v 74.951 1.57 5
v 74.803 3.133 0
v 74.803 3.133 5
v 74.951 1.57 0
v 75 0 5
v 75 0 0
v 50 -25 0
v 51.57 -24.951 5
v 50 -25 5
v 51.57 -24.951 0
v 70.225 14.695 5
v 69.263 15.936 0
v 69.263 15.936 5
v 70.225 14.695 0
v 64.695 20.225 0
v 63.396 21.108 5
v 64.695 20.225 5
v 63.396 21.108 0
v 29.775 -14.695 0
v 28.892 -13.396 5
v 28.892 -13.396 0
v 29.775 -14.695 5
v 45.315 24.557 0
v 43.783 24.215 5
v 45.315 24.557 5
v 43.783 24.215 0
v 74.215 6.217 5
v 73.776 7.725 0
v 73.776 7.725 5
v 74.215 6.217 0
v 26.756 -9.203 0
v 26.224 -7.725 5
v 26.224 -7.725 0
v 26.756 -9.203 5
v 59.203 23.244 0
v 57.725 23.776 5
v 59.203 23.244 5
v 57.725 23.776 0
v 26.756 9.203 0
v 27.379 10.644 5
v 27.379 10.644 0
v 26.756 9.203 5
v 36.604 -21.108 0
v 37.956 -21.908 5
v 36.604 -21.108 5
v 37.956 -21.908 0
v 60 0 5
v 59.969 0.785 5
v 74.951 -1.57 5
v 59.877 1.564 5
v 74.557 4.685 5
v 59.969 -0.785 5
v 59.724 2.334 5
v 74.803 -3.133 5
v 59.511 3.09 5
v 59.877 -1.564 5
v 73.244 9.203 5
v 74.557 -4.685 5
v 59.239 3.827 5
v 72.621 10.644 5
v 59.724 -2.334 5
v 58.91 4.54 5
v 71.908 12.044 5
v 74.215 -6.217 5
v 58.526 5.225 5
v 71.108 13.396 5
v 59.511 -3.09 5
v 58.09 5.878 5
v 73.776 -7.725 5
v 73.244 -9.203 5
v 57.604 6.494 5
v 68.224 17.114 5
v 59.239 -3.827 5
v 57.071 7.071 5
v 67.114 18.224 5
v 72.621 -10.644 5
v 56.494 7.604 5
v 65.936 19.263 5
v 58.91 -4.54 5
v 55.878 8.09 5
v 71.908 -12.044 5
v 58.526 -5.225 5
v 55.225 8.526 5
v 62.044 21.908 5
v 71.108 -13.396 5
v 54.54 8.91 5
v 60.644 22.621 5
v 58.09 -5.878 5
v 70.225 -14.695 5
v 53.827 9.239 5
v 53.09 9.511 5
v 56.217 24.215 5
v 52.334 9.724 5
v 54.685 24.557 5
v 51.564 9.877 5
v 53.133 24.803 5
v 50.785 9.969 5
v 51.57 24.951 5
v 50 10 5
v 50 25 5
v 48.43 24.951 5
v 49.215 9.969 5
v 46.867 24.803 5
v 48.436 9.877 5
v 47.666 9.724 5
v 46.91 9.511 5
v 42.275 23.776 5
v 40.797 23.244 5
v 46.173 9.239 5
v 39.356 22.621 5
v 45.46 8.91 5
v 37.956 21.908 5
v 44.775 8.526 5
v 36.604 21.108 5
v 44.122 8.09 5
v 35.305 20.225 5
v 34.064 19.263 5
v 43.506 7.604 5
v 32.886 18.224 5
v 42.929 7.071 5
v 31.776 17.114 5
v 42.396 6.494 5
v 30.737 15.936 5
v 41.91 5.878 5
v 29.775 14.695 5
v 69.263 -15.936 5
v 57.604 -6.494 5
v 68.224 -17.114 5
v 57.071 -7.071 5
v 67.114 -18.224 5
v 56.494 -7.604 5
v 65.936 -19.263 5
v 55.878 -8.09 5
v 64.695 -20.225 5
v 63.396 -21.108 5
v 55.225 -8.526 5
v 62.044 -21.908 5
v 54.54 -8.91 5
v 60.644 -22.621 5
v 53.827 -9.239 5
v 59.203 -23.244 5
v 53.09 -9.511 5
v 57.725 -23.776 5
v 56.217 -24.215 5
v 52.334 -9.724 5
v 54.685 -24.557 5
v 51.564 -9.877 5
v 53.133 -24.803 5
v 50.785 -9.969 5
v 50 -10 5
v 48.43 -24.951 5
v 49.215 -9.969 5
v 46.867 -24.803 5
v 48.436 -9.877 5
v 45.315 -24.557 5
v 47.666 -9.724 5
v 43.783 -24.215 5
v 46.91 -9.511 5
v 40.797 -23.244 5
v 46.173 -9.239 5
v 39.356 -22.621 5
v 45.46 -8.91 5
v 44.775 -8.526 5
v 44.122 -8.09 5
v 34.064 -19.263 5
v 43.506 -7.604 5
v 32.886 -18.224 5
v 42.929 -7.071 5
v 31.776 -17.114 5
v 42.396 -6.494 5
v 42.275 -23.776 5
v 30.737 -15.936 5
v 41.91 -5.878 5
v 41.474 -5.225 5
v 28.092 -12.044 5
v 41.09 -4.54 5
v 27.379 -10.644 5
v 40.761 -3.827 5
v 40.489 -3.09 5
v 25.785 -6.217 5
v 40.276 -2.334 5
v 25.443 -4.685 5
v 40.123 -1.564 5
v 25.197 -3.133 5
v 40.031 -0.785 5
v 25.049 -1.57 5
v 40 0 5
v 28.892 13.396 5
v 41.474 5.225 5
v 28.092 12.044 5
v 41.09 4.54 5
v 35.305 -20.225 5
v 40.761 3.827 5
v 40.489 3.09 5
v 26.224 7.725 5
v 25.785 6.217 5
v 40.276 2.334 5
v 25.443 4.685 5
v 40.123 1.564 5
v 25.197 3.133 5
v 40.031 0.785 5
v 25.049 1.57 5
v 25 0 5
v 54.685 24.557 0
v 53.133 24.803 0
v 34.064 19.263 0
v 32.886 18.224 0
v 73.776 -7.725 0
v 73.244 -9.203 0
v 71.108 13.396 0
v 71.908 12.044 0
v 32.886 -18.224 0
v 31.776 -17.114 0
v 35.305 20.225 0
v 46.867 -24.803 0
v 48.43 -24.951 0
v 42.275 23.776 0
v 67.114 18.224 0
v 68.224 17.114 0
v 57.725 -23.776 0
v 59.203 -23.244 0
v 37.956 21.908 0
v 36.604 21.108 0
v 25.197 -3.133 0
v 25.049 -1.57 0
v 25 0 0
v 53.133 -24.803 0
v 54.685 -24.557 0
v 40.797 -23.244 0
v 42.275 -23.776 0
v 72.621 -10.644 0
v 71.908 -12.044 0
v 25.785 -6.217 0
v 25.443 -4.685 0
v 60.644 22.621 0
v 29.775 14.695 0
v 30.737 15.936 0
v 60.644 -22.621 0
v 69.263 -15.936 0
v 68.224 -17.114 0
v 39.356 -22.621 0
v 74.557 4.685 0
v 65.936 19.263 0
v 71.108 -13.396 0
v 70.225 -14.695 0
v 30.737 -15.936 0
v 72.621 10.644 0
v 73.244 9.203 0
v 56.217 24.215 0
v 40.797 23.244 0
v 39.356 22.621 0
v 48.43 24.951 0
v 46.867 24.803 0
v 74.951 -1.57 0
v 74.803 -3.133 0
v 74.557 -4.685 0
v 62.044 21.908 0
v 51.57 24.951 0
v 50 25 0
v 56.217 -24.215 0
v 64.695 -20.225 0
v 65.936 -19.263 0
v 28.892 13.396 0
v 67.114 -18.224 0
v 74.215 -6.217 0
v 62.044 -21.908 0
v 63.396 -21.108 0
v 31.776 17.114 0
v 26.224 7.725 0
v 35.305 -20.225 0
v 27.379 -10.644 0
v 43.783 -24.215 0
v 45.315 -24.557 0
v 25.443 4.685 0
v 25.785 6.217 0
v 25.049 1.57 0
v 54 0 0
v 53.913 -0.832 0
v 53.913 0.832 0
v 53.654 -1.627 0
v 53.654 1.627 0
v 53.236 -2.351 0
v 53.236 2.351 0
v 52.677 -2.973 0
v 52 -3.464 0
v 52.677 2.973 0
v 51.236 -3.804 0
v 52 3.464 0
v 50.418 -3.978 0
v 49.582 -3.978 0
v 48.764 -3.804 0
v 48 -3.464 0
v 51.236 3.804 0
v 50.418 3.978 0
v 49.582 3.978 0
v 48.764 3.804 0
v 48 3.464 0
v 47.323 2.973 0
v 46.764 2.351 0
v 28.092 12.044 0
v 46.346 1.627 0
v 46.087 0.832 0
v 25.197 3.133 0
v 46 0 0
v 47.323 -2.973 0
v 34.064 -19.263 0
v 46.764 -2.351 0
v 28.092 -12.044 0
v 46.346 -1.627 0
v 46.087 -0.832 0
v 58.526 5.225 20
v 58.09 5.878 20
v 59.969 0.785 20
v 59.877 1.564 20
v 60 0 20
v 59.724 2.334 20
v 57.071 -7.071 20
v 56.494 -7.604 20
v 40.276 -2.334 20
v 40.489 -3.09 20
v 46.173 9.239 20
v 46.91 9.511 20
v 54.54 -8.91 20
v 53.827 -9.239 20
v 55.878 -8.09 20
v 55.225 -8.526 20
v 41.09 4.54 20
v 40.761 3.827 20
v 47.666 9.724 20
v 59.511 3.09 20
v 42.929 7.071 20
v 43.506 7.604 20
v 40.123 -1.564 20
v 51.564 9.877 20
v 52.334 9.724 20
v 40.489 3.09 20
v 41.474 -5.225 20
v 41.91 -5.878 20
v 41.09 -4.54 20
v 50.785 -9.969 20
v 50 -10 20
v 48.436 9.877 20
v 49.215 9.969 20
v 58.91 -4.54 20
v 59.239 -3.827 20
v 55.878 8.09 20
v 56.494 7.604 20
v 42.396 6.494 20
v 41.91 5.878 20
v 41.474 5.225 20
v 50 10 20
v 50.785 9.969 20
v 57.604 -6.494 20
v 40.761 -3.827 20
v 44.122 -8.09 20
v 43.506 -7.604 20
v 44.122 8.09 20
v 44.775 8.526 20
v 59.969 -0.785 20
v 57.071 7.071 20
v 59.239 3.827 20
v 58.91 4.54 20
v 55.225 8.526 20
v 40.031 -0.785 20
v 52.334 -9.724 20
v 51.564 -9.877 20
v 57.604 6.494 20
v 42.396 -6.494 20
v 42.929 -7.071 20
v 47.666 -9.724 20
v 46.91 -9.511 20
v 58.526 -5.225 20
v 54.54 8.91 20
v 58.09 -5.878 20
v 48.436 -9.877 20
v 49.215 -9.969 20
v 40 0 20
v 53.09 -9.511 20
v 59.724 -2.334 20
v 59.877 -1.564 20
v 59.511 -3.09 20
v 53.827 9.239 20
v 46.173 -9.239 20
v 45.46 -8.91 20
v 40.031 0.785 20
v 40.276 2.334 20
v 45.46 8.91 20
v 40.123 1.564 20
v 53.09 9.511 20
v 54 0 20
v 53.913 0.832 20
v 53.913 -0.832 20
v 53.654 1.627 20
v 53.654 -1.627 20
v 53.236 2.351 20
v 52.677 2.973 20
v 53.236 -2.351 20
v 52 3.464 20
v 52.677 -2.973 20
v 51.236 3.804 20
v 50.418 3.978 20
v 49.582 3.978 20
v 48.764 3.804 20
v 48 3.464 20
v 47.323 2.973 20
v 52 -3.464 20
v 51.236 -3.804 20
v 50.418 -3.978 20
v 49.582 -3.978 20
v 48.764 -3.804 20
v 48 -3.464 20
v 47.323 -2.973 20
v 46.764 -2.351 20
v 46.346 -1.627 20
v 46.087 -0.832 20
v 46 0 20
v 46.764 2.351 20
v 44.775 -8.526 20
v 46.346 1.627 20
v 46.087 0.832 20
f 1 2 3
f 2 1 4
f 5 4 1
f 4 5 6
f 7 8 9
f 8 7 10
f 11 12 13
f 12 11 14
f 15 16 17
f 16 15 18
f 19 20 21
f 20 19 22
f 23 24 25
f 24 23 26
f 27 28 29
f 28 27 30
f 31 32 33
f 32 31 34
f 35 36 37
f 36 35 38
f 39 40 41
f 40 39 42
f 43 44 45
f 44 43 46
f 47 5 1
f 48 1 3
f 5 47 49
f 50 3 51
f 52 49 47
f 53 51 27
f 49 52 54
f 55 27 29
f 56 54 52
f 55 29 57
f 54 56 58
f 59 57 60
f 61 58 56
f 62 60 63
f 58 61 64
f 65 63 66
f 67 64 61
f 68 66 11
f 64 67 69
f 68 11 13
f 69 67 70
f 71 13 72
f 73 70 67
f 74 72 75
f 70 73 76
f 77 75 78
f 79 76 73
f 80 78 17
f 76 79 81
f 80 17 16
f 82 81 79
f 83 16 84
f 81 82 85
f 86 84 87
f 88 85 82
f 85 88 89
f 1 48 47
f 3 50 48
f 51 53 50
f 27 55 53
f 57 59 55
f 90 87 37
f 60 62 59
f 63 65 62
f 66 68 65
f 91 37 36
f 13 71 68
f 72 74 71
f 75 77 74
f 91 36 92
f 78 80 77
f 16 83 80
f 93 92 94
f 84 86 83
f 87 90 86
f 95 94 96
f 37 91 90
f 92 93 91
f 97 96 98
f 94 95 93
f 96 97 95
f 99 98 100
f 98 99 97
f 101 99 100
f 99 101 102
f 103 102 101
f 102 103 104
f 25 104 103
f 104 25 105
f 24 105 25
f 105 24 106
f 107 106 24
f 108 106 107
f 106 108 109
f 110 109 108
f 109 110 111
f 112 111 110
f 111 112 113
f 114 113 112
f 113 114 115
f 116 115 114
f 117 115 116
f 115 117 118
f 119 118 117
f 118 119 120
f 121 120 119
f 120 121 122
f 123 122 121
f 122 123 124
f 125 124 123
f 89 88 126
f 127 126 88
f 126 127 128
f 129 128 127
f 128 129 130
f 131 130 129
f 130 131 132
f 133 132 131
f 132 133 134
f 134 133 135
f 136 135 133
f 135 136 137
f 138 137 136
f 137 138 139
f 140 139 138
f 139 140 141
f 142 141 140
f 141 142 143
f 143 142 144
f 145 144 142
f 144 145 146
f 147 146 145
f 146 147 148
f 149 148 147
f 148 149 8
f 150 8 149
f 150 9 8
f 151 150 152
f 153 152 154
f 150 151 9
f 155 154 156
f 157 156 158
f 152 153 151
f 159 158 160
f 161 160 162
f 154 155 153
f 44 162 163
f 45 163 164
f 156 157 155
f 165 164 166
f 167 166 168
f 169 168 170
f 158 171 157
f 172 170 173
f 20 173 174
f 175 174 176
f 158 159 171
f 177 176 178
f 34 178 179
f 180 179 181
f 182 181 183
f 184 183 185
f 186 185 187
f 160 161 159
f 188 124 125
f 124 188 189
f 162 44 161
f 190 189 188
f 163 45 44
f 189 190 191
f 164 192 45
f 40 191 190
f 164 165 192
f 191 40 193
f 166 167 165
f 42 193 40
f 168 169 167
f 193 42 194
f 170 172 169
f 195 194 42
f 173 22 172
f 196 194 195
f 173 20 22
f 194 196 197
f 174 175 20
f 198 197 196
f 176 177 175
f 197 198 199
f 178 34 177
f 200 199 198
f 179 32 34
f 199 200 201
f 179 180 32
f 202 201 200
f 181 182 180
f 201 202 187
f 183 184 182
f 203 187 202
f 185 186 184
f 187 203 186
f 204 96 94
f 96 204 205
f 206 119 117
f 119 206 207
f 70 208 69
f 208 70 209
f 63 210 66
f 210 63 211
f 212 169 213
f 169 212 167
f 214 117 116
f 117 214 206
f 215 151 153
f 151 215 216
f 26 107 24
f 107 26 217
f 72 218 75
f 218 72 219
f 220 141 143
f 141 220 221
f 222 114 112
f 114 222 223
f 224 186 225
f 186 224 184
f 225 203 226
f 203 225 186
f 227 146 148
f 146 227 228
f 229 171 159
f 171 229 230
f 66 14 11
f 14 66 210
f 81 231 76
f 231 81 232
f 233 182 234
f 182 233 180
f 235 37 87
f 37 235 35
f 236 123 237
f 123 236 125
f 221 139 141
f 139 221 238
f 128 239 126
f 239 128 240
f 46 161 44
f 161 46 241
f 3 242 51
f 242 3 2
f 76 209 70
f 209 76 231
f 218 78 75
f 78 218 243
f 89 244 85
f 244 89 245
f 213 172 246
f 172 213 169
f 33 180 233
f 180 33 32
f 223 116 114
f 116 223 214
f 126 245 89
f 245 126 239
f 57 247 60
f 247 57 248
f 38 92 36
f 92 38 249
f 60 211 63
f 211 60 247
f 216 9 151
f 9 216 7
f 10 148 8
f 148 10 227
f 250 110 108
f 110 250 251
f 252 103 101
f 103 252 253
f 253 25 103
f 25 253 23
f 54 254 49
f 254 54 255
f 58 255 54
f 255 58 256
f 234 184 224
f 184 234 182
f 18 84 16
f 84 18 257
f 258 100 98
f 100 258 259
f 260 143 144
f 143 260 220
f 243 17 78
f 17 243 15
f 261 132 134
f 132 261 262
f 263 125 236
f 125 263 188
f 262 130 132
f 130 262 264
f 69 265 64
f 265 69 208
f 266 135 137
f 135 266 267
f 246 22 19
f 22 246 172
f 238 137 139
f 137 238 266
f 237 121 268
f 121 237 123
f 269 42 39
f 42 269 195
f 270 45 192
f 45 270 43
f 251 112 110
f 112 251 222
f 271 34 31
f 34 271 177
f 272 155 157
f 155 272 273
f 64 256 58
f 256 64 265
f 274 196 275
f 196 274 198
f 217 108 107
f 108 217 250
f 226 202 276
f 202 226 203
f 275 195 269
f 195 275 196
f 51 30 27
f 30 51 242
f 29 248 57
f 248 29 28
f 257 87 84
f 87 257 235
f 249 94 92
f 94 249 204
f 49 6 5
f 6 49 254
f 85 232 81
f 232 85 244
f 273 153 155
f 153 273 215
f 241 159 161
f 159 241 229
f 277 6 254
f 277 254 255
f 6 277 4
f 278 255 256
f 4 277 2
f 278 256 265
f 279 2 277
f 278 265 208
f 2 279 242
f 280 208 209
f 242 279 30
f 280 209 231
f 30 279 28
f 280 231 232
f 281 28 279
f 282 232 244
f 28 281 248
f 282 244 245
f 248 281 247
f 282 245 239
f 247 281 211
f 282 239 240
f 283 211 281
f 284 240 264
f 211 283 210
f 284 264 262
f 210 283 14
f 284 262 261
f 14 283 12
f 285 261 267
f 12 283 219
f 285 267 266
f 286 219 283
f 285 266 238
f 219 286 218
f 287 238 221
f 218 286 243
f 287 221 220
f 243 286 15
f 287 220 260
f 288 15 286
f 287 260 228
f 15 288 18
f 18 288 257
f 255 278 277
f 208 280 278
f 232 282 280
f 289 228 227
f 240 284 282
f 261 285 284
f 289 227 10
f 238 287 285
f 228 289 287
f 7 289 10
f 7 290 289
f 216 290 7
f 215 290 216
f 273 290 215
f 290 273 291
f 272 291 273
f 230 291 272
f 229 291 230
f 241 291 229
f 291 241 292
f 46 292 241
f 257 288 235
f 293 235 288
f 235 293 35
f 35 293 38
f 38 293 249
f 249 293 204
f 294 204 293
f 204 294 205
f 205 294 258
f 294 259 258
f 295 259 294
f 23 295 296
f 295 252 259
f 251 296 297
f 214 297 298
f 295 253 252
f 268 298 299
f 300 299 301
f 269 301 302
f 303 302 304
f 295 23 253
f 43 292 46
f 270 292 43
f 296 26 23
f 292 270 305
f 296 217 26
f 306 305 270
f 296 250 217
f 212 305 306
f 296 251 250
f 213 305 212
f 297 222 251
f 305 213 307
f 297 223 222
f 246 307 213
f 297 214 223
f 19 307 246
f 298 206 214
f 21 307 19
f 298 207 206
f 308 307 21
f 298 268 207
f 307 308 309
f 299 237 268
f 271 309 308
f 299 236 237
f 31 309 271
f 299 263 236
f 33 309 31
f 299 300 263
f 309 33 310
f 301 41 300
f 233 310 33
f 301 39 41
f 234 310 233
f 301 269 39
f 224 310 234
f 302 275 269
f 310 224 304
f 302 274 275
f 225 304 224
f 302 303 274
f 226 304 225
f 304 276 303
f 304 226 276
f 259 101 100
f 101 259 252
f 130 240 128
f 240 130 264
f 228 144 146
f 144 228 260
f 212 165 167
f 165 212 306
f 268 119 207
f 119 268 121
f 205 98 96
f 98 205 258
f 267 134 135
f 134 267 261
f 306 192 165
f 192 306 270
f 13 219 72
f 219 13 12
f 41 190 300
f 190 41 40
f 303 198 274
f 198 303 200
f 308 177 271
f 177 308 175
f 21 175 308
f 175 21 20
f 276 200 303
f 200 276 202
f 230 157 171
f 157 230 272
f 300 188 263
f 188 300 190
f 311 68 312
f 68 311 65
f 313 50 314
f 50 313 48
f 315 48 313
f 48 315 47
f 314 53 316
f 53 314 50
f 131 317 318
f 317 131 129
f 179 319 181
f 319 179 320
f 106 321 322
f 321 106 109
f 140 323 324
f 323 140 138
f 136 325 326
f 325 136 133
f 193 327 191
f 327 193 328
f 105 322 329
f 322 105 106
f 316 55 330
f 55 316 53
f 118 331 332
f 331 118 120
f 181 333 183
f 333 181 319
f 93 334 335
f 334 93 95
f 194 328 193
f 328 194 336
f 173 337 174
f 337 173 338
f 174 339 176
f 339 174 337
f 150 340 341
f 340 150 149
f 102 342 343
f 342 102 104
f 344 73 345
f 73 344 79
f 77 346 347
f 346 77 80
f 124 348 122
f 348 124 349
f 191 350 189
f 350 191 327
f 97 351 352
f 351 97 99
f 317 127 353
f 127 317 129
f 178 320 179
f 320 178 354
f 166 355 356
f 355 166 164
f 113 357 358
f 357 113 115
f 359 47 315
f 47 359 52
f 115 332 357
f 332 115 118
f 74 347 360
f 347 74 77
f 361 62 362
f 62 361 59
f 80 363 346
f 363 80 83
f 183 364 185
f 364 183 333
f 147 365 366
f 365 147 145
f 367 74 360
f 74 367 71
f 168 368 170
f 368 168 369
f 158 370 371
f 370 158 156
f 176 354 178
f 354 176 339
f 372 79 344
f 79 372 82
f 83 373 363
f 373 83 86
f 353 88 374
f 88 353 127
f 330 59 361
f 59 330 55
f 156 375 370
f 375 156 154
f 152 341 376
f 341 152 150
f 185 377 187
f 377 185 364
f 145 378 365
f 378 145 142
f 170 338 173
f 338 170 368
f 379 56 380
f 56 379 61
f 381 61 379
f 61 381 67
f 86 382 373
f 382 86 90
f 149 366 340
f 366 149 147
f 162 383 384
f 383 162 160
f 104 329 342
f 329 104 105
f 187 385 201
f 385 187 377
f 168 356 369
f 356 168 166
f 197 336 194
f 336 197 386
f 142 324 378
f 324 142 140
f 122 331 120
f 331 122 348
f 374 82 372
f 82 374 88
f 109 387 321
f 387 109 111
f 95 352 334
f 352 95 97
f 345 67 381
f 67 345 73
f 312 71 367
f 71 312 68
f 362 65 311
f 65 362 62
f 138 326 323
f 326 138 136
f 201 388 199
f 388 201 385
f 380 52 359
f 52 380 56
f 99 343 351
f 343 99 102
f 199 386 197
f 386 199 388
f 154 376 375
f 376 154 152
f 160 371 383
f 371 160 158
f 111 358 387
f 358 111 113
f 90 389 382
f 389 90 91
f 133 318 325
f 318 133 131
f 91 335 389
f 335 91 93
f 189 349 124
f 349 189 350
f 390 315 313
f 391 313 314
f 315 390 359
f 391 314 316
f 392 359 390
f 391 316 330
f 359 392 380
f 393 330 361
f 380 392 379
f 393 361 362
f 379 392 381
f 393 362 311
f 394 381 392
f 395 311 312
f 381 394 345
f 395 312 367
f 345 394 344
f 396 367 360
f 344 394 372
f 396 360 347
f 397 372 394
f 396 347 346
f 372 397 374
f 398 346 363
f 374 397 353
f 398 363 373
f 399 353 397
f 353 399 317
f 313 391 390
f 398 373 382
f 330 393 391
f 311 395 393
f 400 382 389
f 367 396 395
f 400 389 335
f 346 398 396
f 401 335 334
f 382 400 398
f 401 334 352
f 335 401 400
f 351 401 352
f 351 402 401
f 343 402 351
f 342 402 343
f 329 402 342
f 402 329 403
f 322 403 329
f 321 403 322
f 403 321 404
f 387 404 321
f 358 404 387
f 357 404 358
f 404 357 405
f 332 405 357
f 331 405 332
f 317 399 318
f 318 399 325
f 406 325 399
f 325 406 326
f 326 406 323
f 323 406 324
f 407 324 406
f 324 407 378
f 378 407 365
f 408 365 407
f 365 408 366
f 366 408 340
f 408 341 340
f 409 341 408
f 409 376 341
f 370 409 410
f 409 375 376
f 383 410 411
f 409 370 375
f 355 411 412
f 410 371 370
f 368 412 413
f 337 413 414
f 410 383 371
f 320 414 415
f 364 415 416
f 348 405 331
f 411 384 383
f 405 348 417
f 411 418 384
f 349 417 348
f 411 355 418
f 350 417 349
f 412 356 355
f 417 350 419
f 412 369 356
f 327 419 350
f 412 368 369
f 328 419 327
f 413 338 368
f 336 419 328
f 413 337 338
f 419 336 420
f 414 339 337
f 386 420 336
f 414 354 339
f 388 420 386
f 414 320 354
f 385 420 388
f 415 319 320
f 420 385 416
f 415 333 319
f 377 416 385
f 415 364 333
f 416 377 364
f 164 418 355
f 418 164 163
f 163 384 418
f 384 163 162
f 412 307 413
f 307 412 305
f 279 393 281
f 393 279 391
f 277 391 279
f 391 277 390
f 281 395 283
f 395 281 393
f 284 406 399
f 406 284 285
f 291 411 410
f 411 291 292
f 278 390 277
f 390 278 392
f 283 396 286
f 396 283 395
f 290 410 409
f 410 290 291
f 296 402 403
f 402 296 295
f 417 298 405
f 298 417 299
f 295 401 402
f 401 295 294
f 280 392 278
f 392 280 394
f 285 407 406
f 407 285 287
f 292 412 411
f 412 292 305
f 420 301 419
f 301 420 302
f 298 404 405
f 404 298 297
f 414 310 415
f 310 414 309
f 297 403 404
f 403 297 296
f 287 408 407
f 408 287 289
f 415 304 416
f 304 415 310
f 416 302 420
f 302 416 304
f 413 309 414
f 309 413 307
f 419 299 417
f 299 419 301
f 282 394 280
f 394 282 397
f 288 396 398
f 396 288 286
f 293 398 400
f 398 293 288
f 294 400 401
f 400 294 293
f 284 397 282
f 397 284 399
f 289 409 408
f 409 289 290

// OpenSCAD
//Comandos union y diferencia para restar y unir piezas

translate([50,0,0])

difference(){
    union(){

        cylinder(r=50/2, h=5, $fn =100);

        cylinder ( r= 20/2, h= 20, $fn=80);
}

cylinder( r= 8/2, h=80, $fn= 30, center=true);
}
